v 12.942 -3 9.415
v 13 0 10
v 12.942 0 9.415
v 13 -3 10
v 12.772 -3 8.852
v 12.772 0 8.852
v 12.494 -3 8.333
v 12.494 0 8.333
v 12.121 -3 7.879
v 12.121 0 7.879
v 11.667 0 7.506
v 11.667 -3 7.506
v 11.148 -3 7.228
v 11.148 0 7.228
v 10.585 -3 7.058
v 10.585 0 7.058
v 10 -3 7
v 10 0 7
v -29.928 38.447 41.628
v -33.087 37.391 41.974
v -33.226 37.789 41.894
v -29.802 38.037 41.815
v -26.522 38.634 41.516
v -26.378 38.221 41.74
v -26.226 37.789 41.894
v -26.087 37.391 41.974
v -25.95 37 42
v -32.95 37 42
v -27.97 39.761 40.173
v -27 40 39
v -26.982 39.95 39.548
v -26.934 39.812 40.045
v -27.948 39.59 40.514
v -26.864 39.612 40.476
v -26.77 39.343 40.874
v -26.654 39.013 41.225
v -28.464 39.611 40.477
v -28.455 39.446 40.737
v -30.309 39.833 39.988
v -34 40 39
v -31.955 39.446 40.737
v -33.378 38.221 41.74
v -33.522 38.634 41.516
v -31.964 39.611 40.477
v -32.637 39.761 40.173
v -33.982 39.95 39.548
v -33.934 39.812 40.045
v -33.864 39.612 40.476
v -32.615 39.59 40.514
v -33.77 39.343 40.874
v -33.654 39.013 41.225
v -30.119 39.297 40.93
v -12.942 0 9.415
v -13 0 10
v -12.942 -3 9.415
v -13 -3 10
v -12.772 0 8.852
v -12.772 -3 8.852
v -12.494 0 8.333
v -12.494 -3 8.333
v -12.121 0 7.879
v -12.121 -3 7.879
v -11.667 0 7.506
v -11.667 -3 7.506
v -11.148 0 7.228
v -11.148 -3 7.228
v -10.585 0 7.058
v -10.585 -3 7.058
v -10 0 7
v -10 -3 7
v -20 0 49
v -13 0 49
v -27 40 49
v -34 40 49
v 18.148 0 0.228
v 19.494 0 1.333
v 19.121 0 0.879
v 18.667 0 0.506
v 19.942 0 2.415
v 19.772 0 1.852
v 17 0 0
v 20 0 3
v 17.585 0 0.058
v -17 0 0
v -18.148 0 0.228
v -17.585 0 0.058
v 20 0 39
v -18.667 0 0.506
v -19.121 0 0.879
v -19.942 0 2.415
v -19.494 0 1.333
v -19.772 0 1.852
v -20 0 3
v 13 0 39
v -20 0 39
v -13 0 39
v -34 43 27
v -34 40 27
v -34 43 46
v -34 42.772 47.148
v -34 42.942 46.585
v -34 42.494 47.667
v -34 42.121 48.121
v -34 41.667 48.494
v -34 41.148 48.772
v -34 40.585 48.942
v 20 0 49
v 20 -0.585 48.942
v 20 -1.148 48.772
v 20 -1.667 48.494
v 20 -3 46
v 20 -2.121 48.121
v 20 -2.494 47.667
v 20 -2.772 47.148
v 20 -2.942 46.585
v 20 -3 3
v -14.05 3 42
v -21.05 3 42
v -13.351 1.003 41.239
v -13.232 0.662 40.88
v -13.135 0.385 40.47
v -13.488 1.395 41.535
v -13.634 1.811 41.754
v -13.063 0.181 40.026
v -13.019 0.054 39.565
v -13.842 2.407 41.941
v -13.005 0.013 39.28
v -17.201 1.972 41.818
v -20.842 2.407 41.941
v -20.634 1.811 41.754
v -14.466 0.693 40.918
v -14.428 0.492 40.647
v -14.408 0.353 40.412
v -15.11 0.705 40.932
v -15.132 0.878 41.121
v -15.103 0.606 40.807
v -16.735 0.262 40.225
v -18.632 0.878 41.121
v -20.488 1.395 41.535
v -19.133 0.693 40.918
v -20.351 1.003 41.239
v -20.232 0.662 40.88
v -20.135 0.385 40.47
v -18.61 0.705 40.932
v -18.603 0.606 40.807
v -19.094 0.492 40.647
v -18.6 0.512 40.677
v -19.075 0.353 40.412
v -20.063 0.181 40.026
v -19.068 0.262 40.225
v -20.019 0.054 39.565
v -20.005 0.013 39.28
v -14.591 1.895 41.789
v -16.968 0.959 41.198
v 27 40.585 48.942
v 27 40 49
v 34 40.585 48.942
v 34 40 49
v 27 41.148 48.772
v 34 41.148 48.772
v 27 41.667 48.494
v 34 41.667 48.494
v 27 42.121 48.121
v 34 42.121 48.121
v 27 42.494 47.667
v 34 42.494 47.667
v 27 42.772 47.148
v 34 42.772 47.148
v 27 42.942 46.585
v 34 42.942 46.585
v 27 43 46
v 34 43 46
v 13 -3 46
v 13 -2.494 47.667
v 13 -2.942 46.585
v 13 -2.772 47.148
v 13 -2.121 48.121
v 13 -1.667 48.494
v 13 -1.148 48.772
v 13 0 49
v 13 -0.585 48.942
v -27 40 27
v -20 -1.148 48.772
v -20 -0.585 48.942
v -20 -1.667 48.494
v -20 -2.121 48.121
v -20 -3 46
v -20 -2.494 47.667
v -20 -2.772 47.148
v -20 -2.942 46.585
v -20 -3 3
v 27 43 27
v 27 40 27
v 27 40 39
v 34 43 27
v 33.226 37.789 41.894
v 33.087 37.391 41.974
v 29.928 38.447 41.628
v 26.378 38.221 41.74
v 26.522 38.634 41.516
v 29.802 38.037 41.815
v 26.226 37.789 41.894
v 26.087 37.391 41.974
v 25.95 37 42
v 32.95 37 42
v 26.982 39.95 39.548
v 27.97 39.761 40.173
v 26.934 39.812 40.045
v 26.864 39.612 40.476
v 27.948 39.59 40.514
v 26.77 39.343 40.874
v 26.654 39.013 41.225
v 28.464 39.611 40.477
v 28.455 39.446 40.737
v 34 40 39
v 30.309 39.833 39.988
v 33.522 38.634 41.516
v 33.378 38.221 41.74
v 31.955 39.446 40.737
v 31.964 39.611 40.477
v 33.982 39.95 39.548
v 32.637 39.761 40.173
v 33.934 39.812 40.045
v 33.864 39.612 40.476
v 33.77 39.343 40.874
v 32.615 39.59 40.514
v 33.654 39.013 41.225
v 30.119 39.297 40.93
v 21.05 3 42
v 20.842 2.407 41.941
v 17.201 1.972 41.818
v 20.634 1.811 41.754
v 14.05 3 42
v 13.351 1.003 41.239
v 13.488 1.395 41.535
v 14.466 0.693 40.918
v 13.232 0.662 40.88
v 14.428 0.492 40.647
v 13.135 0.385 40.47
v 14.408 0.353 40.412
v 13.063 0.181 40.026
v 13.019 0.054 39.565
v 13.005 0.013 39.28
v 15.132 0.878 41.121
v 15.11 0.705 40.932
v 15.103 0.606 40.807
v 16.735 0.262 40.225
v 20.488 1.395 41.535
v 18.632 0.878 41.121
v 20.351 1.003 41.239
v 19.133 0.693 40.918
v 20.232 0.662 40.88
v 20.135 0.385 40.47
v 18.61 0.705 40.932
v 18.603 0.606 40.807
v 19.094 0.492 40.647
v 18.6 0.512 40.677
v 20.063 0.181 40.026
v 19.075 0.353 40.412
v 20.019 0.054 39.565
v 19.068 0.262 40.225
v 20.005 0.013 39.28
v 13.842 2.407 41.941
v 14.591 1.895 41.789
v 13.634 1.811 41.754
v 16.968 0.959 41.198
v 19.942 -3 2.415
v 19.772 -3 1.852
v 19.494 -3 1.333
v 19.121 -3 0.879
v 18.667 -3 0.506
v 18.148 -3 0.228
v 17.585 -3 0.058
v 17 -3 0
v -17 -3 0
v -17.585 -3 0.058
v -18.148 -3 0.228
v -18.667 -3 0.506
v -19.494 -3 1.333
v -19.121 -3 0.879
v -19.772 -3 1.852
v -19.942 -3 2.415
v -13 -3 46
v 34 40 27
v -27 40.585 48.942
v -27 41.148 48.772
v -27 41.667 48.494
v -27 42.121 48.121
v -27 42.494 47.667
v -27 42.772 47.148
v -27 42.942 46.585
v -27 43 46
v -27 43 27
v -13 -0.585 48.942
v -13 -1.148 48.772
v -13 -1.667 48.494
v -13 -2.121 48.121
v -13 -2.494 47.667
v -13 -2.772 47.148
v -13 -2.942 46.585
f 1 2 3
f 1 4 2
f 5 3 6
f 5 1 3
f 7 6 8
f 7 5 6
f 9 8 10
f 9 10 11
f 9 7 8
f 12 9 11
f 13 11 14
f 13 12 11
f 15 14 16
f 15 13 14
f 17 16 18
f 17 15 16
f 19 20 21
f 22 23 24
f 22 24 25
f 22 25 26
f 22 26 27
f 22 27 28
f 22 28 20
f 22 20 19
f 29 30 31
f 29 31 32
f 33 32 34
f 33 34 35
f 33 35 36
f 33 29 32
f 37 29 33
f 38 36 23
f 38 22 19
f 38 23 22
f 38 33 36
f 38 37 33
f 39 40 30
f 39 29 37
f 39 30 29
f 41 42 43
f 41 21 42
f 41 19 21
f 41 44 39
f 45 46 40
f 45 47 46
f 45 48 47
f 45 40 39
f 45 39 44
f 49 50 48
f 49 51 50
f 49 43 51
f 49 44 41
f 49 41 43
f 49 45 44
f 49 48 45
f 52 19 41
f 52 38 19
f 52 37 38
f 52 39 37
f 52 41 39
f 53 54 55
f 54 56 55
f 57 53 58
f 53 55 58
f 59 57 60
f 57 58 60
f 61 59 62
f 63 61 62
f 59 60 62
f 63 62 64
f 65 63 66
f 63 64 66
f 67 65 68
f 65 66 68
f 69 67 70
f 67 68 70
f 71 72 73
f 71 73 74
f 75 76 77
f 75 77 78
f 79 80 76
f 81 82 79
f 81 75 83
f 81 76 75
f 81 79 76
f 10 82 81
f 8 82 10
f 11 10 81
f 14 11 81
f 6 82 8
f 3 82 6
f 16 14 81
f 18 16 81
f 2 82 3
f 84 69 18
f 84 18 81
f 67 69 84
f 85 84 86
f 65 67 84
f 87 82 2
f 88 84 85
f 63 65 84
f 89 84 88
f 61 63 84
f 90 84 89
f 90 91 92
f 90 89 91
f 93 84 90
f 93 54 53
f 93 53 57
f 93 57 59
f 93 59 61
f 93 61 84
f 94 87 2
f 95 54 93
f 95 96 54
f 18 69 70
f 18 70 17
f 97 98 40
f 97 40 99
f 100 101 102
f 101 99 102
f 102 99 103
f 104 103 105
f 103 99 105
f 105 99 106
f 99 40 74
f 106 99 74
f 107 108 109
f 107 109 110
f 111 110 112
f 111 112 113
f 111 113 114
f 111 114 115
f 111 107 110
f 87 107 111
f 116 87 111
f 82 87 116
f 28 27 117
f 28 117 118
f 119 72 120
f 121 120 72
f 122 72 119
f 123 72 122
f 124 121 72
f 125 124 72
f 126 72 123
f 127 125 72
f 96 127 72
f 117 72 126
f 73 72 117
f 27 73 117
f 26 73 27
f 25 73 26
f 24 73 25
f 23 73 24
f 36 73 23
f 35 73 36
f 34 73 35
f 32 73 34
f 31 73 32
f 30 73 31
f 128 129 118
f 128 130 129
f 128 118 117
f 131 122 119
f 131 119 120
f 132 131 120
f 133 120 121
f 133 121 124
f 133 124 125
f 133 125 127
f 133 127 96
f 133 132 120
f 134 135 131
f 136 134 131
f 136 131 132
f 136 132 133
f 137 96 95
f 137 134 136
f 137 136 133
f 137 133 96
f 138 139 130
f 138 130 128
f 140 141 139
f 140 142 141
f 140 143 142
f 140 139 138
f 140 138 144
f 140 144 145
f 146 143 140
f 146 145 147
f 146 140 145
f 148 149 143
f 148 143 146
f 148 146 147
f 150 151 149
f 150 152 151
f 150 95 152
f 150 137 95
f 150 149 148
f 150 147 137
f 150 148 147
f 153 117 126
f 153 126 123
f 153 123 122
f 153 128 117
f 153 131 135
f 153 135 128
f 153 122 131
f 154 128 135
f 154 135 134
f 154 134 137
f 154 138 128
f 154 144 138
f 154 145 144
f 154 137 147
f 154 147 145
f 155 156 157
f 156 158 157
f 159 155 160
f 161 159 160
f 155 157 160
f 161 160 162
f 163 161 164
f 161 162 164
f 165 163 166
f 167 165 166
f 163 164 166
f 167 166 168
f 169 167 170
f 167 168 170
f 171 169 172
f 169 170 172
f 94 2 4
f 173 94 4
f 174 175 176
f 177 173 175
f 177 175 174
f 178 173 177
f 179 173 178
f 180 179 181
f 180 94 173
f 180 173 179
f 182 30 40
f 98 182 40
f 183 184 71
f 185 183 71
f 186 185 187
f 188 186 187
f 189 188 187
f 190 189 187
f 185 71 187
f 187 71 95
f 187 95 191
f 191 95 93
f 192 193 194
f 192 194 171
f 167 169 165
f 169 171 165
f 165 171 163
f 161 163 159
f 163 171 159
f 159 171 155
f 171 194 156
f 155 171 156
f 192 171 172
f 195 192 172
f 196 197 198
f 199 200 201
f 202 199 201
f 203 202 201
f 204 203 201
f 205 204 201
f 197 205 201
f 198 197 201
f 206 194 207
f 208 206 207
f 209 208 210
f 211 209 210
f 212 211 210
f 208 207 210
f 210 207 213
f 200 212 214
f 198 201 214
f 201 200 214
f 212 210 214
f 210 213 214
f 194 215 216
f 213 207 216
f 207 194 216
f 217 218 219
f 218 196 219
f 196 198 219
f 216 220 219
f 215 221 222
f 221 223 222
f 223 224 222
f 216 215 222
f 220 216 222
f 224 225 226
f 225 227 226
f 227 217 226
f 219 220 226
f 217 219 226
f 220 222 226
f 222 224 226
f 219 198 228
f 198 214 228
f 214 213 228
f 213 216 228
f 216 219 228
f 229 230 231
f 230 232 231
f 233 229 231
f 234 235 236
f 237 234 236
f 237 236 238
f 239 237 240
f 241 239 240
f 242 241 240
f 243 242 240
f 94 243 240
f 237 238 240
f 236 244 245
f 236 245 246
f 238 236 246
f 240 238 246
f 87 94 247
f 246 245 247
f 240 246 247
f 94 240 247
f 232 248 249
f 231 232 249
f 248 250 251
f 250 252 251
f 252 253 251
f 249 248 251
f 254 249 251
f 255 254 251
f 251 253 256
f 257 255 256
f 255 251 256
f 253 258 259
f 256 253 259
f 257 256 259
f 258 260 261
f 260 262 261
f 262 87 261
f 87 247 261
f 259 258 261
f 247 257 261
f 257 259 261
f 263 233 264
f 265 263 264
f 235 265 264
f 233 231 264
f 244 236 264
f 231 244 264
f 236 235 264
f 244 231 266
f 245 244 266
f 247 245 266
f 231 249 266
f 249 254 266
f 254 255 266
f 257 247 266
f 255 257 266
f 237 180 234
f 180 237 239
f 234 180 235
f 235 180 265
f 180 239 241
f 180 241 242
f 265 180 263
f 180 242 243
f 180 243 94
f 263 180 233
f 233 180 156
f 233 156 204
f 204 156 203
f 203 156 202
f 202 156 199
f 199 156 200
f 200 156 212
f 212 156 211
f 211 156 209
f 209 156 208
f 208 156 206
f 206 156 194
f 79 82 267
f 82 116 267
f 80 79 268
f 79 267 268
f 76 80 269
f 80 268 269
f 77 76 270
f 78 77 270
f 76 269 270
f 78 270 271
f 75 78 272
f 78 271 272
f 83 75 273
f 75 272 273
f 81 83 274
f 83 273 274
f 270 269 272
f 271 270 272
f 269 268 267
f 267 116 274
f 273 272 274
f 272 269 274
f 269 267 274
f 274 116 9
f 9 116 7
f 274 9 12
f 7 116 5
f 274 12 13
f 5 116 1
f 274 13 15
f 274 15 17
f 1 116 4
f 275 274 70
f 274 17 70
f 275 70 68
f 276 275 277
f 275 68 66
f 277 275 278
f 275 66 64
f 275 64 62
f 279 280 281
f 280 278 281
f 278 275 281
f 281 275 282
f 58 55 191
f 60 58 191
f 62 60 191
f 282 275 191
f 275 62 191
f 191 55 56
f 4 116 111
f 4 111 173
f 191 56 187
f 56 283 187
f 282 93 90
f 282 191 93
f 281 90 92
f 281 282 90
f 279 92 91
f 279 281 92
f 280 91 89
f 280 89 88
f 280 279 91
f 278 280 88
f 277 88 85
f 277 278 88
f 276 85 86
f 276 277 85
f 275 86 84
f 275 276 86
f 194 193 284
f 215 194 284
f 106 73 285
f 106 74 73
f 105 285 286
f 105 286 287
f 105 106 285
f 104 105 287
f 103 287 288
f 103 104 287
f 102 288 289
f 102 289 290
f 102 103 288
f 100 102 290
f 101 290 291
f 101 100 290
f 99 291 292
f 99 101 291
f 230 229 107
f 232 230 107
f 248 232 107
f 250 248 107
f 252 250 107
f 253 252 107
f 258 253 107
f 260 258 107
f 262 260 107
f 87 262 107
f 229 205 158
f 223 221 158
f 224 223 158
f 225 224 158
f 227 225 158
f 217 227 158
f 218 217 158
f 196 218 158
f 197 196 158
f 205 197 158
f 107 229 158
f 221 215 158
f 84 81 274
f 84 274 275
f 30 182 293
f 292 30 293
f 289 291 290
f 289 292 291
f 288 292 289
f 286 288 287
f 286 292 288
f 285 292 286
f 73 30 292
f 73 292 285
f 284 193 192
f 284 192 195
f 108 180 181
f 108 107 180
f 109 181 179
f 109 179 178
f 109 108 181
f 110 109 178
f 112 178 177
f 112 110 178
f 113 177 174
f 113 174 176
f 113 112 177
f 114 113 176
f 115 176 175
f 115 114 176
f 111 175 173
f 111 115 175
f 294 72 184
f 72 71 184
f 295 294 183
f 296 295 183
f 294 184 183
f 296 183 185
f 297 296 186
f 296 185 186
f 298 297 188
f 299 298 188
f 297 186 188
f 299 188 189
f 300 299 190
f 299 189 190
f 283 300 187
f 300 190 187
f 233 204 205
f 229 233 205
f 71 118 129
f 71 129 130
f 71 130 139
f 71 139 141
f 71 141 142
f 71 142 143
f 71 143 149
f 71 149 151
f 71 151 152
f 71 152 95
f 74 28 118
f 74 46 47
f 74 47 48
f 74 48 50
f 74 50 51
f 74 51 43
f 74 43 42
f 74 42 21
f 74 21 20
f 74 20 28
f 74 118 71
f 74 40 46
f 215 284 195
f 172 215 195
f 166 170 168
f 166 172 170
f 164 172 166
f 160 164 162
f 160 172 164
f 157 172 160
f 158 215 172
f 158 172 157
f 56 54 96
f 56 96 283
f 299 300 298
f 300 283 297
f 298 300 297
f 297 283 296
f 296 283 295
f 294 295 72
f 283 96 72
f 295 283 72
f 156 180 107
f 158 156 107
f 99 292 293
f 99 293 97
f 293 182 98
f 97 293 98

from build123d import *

# Parameters (mm, degrees)
F1_DEPTH = 3
F2_W     = 7
F2_H     = 7
F4_W     = 7
F4_H     = 7
F6_W     = 7
F6_H     = 22
F7_DEPTH = 3
F8_R     = 3


with BuildPart() as f1:
    # F0 (on Front) → F1 (new body)
    with BuildSketch(Plane.XZ):
        Polygon((-13, 49), (-20, 49), (-20, 0), (0, 0), (0, 7), (-13, 7), align=None)
    extrude(amount=F1_DEPTH)

    # F2 (on face) → F5 section 0
    with BuildSketch(Plane(origin=(0, 0, 0), x_dir=(-1, 0, 0), z_dir=(0, 1, 0))):
        with Locations((16.5, 45.5)):
            Rectangle(F2_W, F2_H)
    # F4 (on offset) → F5 section 1
    with BuildSketch(Plane(origin=(0, 40, 0), x_dir=(-1, 0, 0), z_dir=(0, 1, 0))):
        with Locations((30.5, 45.5)):
            Rectangle(F4_W, F4_H)
    loft()

    # F6 (on face) → F7 (join)
    with BuildSketch(Plane(origin=(0, 40, 0), x_dir=(-1, 0, 0), z_dir=(0, 1, 0))):
        with Locations((30.5, 38)):
            Rectangle(F6_W, F6_H)
    extrude(amount=F7_DEPTH)

    # F8
    f8_edges = [f1.edges().sort_by_distance(p)[0] for p in [
        (-13, -1.5, 7),
        (-20, -1.5, 0),
        (-16.5, -3, 49),
        (-16.5, 0, 42),
        (-30.5, 40, 42),
        (-30.5, 43, 49),
    ]]
    fillet(f8_edges, radius=F8_R)

    # F9: F1 across plane


with BuildPart() as f1_1:
    add(f1.part)
    add(f1.part.mirror(Plane.YZ))


solid = f1_1.part
